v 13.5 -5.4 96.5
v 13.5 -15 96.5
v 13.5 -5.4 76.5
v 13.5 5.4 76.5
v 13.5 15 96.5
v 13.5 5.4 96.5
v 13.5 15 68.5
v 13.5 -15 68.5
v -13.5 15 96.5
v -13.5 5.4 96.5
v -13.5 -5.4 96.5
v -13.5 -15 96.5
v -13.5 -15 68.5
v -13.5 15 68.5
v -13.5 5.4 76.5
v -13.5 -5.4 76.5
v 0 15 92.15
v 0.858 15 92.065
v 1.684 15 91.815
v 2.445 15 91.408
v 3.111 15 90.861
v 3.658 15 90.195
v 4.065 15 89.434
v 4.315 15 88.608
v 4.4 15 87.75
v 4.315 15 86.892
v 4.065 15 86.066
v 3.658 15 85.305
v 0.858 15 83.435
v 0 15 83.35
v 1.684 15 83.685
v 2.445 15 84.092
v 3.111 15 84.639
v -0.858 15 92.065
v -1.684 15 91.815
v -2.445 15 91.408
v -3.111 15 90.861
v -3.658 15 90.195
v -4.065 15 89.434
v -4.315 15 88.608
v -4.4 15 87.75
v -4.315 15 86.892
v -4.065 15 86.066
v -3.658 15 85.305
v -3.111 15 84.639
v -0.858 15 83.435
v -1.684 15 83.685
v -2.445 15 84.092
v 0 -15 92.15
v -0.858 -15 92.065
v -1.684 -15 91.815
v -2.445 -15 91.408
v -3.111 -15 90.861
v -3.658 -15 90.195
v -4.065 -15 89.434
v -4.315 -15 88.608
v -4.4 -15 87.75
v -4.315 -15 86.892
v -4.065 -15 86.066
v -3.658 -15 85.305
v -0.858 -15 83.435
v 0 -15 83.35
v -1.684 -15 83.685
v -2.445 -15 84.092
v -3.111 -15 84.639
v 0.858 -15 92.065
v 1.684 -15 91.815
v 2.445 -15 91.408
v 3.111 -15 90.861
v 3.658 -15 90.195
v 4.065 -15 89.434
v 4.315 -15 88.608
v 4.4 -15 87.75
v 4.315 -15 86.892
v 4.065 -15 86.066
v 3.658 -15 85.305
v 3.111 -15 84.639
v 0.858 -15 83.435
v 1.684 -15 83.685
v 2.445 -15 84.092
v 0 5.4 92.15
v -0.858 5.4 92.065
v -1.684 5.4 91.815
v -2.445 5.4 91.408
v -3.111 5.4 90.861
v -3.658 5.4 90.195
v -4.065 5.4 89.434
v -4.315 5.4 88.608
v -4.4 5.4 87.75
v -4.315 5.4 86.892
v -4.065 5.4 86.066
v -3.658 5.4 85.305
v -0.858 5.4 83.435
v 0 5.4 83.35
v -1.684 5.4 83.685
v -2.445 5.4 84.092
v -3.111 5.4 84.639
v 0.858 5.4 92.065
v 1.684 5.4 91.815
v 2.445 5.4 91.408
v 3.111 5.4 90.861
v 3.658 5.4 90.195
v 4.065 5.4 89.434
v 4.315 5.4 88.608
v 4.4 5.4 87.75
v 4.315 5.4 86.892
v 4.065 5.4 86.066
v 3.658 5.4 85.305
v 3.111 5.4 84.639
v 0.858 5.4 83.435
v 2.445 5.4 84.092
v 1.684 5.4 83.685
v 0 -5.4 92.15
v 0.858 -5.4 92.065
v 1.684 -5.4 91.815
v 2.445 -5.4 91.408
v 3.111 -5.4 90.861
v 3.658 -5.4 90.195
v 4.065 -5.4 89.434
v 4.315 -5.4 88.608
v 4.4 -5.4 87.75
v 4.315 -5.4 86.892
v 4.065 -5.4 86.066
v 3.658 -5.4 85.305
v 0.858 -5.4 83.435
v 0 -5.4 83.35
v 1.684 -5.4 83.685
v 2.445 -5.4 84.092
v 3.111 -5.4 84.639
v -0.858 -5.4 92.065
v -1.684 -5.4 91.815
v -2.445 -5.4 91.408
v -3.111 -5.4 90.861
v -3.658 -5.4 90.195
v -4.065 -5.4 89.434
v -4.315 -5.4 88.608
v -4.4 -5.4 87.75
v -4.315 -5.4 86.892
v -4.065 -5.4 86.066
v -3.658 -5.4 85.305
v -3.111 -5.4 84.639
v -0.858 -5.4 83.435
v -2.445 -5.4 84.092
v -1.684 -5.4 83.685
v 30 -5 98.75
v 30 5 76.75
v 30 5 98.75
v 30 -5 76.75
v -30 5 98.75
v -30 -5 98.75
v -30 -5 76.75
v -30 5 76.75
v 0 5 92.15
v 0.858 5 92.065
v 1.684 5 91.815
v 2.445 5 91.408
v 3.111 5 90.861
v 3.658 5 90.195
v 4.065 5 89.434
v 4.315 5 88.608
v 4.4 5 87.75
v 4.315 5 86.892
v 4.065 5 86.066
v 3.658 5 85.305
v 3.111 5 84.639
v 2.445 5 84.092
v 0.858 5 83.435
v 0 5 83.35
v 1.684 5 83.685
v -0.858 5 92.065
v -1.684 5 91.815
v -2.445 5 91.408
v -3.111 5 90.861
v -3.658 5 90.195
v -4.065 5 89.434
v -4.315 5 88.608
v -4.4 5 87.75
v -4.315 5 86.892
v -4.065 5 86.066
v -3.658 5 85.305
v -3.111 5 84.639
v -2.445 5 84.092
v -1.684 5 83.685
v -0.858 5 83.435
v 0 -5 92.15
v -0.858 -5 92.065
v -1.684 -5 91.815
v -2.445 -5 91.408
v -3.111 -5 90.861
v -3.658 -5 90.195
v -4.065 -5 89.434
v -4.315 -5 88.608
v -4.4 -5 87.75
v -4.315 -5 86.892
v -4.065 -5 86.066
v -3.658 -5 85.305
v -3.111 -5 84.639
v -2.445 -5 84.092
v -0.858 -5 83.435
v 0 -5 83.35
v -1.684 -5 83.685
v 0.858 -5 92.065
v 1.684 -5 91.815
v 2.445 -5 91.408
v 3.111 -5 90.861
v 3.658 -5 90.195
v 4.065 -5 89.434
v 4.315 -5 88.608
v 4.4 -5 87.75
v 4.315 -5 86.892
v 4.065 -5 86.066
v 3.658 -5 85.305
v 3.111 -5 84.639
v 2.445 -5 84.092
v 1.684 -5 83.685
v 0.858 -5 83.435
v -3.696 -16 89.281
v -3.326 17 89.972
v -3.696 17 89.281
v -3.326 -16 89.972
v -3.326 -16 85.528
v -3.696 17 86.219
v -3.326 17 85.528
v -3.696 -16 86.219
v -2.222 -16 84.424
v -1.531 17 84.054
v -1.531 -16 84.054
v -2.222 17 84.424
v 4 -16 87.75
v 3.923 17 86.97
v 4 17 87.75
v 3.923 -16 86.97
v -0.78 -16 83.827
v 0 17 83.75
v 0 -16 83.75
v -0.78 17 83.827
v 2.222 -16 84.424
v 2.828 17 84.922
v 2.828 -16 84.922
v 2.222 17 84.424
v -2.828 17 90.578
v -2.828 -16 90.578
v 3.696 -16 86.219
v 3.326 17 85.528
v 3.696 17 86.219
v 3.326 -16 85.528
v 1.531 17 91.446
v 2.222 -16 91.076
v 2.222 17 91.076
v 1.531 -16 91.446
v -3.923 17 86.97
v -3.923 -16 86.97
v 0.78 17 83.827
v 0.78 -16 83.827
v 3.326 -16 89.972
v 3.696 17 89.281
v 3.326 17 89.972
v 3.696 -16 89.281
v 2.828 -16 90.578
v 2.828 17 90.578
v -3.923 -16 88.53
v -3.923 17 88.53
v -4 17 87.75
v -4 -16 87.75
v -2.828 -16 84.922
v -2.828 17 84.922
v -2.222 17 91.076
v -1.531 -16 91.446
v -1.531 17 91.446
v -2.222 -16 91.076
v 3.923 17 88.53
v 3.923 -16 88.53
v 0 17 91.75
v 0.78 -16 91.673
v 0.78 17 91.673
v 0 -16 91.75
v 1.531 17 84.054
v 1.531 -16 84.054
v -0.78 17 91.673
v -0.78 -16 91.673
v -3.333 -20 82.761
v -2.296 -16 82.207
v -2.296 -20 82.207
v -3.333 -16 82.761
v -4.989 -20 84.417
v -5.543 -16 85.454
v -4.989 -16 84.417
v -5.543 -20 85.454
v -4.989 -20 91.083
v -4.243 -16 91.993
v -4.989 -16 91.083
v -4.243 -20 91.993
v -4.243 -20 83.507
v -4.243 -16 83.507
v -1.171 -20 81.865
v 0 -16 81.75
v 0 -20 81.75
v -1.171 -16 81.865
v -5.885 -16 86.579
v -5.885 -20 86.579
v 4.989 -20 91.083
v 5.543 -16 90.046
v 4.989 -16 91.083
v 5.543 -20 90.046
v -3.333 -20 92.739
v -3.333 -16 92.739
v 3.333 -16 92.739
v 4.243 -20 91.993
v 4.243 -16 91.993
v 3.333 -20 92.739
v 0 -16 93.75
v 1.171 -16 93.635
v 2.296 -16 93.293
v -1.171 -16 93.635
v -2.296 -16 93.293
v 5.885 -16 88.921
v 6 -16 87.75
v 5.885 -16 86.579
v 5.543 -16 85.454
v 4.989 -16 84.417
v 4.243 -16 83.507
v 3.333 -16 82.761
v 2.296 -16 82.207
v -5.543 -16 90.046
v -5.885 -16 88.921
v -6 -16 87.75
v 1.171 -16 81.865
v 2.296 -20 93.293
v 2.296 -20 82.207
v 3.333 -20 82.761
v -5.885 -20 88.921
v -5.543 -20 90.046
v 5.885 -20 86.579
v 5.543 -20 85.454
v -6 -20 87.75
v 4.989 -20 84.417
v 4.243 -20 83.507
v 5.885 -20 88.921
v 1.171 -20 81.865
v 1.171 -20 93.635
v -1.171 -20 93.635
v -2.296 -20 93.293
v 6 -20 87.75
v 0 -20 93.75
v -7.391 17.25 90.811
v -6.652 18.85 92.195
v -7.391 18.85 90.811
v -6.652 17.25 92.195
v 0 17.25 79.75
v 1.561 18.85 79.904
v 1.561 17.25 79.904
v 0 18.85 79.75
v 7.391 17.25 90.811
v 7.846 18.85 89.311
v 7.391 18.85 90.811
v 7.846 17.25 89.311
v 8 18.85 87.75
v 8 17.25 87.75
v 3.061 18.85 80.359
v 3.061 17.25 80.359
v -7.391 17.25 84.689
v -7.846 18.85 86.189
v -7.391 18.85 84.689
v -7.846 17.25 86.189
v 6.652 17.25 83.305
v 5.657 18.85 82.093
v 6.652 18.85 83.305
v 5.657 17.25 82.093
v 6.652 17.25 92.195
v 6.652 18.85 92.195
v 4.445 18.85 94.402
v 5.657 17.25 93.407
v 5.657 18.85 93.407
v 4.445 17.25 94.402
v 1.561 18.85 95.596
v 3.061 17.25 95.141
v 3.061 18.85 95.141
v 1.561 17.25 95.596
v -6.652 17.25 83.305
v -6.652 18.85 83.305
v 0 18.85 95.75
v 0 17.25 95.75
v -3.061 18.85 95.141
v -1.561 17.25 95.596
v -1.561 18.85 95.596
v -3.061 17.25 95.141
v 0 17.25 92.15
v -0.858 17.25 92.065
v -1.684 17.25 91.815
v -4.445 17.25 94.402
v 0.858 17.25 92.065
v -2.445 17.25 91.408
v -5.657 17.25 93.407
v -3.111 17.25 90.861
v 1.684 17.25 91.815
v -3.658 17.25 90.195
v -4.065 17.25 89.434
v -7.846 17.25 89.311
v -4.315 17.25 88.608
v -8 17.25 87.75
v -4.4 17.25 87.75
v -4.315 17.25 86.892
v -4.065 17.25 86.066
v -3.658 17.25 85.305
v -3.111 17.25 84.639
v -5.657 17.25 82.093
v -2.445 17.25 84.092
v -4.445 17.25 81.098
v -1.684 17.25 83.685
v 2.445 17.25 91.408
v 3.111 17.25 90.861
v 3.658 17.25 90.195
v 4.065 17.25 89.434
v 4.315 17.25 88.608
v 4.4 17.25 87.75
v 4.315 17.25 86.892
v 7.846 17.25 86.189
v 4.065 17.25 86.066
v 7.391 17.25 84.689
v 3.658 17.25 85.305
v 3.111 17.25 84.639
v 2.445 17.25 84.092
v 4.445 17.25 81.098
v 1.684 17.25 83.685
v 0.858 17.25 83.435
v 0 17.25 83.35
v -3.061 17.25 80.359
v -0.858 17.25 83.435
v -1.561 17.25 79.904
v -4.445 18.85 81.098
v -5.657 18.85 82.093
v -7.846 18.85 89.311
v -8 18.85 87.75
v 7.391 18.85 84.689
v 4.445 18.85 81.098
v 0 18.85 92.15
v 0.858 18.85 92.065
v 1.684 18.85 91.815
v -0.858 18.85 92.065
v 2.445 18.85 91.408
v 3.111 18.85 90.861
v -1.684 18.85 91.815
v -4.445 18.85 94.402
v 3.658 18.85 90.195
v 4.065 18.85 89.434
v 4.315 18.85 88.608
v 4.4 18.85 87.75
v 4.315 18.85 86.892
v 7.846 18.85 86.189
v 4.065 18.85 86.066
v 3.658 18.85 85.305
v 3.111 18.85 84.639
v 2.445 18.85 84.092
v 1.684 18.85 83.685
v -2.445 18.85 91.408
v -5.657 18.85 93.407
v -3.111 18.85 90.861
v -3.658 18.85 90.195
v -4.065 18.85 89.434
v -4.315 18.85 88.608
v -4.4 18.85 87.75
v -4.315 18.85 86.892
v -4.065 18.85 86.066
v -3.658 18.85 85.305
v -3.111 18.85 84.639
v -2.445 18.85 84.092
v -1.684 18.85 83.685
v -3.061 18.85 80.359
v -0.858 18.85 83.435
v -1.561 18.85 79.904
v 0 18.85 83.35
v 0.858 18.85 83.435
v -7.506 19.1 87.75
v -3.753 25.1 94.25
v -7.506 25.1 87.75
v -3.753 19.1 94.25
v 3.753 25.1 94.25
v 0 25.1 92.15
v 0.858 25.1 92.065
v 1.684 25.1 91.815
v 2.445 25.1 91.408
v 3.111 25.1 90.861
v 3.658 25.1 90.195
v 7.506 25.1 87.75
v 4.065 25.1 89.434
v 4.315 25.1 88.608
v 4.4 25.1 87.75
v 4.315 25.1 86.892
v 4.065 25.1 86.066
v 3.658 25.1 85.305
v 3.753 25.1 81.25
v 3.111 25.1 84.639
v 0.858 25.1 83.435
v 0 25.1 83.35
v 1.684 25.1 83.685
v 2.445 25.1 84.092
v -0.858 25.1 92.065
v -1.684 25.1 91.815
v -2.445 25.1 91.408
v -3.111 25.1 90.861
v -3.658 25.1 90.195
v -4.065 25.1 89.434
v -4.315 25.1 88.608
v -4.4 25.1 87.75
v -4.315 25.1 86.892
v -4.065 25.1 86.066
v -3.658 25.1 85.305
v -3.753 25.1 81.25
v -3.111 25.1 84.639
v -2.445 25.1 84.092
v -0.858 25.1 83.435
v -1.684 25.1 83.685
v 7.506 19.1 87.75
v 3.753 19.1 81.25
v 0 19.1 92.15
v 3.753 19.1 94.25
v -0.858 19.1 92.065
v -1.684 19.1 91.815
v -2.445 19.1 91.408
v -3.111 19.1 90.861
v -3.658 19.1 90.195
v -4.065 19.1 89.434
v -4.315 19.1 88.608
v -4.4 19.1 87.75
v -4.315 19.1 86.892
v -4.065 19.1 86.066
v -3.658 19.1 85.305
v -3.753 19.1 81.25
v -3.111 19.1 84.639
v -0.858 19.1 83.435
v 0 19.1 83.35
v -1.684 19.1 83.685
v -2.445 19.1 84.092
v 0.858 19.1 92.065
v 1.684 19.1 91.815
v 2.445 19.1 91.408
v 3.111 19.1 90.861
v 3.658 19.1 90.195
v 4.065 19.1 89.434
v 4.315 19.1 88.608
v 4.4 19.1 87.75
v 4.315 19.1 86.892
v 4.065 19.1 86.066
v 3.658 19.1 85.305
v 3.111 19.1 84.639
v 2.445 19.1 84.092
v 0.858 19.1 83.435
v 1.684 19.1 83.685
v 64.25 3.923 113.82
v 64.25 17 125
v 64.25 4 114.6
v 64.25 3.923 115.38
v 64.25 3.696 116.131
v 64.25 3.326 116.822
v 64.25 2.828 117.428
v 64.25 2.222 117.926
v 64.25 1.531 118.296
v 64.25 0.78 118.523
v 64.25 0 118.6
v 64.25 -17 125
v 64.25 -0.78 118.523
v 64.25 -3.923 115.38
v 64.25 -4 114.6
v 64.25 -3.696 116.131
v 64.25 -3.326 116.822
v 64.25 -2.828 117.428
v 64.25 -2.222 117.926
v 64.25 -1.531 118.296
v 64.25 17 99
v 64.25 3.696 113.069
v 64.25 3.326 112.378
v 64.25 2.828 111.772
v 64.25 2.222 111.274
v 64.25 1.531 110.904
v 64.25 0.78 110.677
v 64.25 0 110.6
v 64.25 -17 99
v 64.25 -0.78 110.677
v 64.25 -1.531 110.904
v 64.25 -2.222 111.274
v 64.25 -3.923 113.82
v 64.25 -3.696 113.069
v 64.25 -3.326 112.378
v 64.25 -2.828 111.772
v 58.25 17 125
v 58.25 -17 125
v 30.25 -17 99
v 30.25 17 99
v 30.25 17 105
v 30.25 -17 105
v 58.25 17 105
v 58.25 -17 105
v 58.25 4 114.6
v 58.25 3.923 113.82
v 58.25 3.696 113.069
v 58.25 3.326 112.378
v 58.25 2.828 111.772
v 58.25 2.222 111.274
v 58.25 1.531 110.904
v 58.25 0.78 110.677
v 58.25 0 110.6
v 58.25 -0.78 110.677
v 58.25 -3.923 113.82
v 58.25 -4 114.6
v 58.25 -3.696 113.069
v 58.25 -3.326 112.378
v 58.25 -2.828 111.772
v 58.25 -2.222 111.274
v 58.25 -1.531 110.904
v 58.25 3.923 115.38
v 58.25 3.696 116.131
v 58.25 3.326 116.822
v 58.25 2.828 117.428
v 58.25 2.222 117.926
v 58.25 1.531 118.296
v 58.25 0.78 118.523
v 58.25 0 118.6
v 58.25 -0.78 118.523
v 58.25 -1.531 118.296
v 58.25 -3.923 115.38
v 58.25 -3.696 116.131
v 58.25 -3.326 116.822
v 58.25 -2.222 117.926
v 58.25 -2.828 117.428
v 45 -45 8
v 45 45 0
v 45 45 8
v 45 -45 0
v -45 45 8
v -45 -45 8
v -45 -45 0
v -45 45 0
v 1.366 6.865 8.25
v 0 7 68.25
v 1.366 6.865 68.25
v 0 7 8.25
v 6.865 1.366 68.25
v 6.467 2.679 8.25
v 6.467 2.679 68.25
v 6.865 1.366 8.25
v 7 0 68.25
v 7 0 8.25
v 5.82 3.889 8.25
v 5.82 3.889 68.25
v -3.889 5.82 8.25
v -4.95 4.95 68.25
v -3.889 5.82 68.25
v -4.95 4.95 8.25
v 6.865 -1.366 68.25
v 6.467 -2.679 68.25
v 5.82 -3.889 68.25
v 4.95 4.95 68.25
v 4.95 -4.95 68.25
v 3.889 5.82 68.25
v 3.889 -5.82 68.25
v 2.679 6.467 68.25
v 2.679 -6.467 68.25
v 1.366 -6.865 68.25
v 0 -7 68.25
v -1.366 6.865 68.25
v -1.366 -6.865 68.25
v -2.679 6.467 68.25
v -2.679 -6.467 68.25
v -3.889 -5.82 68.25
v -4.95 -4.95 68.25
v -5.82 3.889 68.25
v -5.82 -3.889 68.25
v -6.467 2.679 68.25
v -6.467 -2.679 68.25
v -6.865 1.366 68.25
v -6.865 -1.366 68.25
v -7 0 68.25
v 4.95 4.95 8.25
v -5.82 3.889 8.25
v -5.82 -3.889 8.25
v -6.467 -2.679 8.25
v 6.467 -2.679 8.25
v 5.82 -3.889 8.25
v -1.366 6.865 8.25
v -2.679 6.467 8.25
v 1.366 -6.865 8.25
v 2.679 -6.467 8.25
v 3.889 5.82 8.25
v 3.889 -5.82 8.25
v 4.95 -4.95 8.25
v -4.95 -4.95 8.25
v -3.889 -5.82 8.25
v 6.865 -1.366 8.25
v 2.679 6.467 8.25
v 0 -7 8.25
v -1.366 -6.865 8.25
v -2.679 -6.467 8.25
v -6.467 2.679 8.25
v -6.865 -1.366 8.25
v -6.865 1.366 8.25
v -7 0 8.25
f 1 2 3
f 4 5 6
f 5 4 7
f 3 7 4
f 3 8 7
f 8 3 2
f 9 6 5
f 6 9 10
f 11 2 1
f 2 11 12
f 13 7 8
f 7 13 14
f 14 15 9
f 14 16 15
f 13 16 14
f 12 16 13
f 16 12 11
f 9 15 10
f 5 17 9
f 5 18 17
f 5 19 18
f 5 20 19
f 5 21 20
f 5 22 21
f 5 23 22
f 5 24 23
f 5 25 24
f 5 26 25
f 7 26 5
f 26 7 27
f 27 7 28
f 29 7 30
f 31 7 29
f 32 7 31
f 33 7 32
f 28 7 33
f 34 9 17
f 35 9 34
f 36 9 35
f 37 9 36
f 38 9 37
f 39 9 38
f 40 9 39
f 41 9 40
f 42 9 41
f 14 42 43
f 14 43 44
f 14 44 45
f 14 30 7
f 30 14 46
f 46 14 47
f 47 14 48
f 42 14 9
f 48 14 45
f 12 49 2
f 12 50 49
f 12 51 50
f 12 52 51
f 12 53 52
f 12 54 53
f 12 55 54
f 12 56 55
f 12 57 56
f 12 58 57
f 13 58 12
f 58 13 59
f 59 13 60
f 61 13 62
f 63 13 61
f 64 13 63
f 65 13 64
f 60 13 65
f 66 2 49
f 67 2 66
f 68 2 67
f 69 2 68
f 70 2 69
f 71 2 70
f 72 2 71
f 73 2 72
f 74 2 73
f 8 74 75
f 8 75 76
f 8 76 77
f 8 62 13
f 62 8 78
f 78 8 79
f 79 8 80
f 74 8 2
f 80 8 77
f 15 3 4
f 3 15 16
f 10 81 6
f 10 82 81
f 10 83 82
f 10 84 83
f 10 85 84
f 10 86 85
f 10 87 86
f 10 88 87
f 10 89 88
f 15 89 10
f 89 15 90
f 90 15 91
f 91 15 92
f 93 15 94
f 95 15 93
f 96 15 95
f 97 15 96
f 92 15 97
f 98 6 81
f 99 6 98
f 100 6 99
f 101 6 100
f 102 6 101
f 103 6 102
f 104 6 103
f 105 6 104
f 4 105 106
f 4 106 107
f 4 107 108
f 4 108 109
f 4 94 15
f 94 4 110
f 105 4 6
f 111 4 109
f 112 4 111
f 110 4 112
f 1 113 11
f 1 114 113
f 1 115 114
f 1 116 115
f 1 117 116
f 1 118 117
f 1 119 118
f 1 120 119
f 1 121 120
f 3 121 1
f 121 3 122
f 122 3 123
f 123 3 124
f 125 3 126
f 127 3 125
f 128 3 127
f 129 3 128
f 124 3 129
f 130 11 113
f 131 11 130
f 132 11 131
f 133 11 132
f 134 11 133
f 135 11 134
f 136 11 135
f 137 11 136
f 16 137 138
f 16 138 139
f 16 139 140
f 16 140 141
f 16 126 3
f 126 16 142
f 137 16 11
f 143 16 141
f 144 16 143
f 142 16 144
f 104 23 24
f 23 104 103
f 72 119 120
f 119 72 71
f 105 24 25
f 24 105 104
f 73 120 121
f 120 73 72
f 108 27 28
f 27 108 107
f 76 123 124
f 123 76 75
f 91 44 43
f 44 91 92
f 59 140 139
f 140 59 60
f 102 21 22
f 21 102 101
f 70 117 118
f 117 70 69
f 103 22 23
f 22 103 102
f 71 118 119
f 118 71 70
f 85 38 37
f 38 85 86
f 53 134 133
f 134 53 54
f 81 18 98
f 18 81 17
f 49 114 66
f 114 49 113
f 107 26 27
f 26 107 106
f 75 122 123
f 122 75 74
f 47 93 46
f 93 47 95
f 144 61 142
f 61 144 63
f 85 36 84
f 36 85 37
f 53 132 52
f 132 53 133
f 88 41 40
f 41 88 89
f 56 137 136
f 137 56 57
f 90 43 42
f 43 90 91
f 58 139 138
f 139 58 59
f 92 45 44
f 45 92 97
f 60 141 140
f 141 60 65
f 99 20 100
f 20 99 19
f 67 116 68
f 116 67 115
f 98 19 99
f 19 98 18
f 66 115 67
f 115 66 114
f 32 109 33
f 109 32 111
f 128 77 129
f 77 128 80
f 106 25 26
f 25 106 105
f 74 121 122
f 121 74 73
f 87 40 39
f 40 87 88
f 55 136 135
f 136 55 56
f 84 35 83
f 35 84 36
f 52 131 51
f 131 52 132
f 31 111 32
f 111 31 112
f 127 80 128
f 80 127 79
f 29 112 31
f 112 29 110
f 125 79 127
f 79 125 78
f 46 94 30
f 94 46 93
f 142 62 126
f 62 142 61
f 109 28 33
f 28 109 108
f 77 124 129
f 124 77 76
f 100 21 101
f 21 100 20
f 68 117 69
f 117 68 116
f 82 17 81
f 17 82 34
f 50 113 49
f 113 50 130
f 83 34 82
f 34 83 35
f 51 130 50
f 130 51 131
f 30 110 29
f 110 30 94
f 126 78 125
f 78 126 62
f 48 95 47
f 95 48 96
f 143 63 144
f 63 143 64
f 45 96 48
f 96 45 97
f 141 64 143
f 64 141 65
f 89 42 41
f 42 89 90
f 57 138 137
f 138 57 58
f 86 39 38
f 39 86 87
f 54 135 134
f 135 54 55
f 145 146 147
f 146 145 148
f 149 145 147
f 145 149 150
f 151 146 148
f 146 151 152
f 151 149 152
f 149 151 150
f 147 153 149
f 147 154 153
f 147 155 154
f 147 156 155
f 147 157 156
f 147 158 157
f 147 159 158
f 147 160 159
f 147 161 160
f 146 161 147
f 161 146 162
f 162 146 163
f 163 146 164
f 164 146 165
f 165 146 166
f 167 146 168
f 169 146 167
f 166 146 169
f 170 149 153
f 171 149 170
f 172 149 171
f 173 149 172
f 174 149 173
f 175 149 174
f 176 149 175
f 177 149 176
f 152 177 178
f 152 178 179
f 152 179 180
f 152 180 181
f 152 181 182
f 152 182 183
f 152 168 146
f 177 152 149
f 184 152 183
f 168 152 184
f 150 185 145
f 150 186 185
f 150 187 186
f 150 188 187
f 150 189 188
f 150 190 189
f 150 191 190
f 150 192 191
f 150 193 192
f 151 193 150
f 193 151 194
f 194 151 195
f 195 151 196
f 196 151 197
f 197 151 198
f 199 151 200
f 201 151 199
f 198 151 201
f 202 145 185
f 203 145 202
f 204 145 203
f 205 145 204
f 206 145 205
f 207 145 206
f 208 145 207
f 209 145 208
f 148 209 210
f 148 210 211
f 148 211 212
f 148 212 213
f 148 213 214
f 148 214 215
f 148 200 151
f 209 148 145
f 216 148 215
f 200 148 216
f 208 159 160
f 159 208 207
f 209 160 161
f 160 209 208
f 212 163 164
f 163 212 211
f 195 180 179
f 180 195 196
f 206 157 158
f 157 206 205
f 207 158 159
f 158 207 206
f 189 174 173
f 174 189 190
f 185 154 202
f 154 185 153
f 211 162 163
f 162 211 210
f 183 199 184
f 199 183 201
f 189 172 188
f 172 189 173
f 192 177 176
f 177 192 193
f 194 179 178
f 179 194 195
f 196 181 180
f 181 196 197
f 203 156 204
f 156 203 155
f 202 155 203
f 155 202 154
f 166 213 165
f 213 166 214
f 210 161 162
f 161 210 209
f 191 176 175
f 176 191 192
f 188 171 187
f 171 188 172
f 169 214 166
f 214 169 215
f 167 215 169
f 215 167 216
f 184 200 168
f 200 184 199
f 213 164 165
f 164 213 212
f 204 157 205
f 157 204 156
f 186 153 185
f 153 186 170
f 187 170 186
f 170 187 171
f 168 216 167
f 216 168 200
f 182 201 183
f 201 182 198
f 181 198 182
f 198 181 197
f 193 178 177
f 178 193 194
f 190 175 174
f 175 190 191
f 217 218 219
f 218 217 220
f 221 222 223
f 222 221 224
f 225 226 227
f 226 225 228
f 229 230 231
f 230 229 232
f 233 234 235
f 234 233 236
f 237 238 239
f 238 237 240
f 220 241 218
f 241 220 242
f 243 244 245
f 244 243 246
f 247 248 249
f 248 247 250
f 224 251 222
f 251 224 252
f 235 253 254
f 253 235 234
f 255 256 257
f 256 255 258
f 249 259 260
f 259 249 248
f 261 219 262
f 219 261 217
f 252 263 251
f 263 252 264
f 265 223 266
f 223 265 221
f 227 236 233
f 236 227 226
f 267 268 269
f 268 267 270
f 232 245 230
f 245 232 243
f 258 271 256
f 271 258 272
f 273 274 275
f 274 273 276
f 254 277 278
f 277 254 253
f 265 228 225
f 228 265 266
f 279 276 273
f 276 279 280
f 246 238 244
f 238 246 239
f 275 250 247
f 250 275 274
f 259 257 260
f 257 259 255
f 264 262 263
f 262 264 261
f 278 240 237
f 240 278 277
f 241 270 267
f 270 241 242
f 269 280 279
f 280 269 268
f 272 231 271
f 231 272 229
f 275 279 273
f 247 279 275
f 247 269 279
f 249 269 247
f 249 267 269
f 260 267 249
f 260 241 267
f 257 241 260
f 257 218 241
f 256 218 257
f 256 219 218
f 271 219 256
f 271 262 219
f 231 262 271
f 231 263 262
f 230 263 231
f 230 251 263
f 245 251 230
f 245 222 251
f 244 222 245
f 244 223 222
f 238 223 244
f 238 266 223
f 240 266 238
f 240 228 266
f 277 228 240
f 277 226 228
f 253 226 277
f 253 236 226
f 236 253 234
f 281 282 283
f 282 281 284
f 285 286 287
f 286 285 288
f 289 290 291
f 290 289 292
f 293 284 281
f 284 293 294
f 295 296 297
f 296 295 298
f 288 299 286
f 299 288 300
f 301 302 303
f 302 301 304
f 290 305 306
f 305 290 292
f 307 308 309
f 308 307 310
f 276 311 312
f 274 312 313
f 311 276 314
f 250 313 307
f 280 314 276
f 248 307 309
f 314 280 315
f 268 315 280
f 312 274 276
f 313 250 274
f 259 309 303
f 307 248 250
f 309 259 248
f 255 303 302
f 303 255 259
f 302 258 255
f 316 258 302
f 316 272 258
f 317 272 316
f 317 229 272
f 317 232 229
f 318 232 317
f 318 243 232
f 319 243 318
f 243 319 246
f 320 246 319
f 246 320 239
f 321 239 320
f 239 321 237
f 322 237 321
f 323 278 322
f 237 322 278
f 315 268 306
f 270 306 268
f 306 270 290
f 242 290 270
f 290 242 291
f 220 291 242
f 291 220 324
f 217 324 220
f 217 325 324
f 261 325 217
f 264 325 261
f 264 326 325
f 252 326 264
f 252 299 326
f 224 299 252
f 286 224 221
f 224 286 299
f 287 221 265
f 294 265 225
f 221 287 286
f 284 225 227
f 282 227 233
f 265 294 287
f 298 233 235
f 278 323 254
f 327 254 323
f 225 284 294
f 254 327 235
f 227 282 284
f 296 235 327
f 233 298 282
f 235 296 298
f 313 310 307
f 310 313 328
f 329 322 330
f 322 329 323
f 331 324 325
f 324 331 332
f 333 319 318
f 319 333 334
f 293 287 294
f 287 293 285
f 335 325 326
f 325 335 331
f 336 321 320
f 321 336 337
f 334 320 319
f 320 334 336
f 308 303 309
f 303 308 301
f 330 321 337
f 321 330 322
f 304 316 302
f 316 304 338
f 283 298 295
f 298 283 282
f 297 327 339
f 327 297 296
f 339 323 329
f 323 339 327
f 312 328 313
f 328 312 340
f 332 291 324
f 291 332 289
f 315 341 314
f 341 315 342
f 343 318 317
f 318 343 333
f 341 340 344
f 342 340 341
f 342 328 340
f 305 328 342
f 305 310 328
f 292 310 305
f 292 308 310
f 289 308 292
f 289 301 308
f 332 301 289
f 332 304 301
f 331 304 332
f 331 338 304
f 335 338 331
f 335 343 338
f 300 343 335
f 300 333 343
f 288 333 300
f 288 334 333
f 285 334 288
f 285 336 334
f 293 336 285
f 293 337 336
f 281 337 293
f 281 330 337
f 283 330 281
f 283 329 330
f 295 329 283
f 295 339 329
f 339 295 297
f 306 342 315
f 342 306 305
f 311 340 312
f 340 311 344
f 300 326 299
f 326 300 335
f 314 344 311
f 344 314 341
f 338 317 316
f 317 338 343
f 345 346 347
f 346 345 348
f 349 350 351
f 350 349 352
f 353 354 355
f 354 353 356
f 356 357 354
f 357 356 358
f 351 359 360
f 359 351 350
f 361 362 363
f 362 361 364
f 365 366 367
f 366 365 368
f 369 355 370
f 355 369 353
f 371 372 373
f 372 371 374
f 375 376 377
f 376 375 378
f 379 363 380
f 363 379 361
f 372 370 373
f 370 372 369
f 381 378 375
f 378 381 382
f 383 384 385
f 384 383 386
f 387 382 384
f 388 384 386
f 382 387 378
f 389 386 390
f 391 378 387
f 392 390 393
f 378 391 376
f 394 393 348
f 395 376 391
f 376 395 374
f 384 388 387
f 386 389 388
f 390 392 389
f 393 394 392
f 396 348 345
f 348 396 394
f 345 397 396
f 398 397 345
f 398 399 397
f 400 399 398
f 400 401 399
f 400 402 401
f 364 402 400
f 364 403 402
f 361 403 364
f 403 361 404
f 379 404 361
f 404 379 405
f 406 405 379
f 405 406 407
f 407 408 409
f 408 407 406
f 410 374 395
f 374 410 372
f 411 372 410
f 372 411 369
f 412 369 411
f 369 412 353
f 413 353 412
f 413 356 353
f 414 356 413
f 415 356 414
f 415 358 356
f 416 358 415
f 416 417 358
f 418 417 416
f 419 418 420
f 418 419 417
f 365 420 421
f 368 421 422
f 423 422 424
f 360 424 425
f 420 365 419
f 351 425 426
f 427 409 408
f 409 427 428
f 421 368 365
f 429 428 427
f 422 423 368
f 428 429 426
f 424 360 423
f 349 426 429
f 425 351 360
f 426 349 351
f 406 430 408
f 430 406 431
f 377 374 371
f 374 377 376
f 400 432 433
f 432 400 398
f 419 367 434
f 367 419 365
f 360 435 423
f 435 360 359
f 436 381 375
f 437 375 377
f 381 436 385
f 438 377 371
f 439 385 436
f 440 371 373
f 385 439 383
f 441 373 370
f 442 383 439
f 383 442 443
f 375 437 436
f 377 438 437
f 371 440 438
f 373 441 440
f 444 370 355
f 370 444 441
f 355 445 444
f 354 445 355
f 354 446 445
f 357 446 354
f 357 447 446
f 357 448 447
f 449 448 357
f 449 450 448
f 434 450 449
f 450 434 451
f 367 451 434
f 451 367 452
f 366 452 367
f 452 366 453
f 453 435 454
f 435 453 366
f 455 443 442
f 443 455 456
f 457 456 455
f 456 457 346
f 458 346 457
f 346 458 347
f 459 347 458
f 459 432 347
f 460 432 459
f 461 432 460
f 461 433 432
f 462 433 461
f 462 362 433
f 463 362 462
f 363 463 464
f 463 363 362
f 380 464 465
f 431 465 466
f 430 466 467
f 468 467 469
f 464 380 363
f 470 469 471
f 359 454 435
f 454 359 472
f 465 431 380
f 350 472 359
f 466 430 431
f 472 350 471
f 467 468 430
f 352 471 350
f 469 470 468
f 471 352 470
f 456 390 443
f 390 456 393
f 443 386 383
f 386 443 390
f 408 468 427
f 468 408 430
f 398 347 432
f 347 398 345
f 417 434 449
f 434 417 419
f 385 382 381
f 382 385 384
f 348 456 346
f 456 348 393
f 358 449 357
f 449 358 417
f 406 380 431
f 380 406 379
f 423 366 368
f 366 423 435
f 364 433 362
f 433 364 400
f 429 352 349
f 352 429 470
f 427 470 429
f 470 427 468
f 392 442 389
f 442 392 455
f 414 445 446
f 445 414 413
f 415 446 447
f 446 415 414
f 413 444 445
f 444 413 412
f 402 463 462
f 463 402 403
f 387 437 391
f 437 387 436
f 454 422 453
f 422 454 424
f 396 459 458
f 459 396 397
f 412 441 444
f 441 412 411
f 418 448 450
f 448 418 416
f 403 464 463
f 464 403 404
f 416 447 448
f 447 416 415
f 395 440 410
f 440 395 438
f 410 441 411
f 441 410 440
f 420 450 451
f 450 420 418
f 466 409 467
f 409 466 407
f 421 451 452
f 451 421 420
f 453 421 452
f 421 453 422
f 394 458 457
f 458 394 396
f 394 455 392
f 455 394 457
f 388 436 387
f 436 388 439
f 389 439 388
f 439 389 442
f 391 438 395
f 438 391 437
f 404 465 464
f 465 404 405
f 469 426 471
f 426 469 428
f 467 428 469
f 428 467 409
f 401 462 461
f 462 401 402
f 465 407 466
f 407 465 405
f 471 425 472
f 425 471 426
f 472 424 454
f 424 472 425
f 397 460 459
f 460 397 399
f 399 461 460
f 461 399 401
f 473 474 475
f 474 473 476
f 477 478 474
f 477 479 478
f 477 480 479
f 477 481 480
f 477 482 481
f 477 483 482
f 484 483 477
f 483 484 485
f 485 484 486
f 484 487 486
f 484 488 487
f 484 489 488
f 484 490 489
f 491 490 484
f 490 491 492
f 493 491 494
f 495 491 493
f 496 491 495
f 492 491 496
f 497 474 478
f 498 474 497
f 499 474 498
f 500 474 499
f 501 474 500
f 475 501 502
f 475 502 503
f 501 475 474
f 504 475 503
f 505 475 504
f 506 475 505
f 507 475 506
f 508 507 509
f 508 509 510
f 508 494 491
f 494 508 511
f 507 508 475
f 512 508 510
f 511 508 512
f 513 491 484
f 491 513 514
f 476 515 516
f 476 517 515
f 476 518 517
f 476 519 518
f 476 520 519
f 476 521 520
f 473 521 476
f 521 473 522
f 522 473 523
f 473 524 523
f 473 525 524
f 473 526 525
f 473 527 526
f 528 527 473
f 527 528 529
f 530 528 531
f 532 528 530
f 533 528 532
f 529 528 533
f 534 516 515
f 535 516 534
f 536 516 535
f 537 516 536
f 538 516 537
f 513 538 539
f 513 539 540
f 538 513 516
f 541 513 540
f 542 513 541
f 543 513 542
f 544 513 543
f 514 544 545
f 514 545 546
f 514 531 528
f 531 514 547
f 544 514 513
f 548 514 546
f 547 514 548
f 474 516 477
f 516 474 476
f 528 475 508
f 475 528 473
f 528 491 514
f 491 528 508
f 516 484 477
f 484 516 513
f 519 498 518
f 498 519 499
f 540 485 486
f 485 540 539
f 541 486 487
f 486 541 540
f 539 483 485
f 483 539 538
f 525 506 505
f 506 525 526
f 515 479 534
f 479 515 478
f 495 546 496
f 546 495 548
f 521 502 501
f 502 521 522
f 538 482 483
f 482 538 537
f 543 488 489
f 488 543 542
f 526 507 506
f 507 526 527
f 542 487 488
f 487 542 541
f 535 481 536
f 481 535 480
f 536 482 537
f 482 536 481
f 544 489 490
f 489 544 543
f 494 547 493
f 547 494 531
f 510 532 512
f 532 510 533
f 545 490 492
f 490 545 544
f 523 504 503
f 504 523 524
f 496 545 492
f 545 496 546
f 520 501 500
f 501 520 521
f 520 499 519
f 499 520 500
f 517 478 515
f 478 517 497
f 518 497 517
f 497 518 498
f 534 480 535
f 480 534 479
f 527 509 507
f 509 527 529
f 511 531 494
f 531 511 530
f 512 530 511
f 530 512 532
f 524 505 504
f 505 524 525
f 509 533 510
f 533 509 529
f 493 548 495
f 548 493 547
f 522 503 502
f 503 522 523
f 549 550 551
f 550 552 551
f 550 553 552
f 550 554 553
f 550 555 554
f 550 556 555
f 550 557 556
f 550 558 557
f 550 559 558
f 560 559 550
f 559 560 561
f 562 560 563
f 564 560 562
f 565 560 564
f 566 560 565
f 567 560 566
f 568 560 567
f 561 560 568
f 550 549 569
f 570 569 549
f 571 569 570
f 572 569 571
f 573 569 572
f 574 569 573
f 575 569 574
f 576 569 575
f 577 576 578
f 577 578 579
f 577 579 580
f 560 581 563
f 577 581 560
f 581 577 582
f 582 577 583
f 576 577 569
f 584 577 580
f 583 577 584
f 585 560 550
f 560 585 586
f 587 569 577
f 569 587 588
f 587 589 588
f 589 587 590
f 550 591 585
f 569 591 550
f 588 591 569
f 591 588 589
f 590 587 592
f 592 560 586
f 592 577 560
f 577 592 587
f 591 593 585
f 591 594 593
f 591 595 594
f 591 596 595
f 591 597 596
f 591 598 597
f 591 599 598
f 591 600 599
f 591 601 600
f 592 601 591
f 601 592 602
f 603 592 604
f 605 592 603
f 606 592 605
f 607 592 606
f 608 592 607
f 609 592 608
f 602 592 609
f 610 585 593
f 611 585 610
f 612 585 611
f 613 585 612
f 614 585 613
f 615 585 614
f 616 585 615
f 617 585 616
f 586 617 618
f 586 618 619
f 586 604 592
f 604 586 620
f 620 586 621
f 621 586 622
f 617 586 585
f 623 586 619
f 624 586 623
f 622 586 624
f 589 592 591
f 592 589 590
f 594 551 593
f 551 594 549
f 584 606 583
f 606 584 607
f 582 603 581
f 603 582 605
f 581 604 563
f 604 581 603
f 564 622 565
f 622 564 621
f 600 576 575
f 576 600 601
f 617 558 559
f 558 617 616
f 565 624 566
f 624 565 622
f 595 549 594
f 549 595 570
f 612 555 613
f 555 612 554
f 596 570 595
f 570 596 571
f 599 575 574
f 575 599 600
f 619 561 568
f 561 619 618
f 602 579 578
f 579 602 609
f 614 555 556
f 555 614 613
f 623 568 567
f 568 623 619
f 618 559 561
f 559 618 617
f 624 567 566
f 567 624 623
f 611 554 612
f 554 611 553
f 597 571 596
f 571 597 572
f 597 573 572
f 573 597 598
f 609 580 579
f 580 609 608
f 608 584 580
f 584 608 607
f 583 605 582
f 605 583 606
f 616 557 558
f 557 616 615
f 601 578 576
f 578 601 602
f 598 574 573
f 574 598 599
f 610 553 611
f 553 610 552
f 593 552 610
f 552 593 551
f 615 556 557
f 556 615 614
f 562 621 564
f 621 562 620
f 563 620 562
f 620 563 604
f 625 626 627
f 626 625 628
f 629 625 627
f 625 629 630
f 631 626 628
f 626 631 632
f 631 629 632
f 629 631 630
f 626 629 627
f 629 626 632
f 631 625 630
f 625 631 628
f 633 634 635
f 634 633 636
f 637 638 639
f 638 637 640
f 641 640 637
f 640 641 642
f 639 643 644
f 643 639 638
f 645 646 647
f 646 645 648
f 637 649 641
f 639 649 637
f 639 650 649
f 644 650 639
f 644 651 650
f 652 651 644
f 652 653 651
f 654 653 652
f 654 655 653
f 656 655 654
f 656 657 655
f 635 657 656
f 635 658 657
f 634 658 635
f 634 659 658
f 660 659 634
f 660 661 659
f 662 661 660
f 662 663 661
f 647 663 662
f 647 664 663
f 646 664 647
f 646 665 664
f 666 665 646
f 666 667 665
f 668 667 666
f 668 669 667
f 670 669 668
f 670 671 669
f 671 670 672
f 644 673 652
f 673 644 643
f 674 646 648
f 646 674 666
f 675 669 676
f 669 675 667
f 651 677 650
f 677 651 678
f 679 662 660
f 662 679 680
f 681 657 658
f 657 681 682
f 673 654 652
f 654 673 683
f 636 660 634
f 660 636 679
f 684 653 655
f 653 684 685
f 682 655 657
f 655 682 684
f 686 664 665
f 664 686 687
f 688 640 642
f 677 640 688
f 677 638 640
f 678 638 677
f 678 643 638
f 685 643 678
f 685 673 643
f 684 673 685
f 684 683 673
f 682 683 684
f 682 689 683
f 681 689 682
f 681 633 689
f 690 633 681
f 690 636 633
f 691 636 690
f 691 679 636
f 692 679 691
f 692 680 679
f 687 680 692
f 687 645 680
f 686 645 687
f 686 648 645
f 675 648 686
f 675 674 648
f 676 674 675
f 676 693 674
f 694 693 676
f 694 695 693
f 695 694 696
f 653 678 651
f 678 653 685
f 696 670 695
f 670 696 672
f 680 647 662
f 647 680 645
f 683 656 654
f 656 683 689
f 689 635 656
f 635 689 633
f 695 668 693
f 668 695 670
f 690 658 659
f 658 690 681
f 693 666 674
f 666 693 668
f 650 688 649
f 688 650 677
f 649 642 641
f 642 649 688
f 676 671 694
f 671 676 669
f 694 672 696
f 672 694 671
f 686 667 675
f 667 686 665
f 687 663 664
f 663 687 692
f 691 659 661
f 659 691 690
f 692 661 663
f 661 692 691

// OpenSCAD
$fn = 32;

// ------------------------------------------------------------------------
// Lamp arm: column d14 x 60 mm, arm 60 mm
// Every part is its own module, assembly() places every instance.
// ------------------------------------------------------------------------

// --- part 1 ---
module lamp_base() {
  difference() {
    translate([-45, -45, 0]) cube([90, 90, 8]);
  }
}

// --- part 2 ---
module lamp_column() {
  cylinder(h = 60, d = 14);
}

// --- part 3 ---
module head_fork() {
  difference() {
    translate([-13.5, -15, 0]) cube([27, 30, 28]);
    translate([-14.5, -5.4, 8]) cube([29, 10.8, 21]);
    translate([0, 0, 19.25]) rotate([90, 0, 0]) cylinder(h = 32, d = 8.8, center = true);
  }
}

// --- part 4 ---
module lamp_arm() {
  difference() {
    translate([-30, -5, 0]) cube([60, 10, 22]);
    translate([0, 0, 11]) rotate([90, 0, 0]) cylinder(h = 12, d = 8.8, center = true);
  }
}

// --- part 5 ---
module arm_pin() {
  rotate([0, 90, 0]) cylinder(h = 34, d = 8, center = true);
  translate([-20, 0, 0]) rotate([0, 90, 0]) cylinder(h = 4, d = 12);
}

// --- part 6 ---
module arm_washer() {
  difference() {
      translate([0, 0, 0]) cylinder(h = 1.6, d = 16);
      translate([0, 0, -1]) cylinder(h = 3.6, d = 8.8);
    }
}

// --- part 7 ---
module arm_nut() {
  difference() {
    linear_extrude(height = 6) polygon(points = [[7.506, 0], [3.753, 6.5], [-3.753, 6.5], [-7.506, 0], [-3.753, -6.5], [3.753, -6.5]]);
    translate([0, 0, -1]) cylinder(h = 8, d = 8.8);
  }
}

// --- part 8 ---
module shade_bracket() {
  difference() {
    translate([-17, -17, 0]) cube([34, 34, 26]);
    translate([-18, -18, 6]) cube([29, 36, 21]);
    translate([14, 0, 15.6]) rotate([0, 90, 0]) cylinder(h = 8, d = 8, center = true);
  }
}

// --- assembly ---
module assembly() {
  color([0.80, 0.24, 0.20]) translate([0, 0, 0]) rotate([0, 0, 0]) lamp_base();
  color([0.20, 0.45, 0.75]) translate([0, 0, 8.25]) rotate([0, 0, 0]) lamp_column();
  color([0.25, 0.62, 0.32]) translate([0, 0, 68.5]) rotate([0, 0, 0]) head_fork();
  color([0.92, 0.70, 0.18]) translate([0, 0, 76.75]) rotate([0, 0, 0]) lamp_arm();
  color([0.58, 0.35, 0.70]) translate([0, 0, 87.75]) rotate([0, 0, 90]) arm_pin();
  color([0.16, 0.66, 0.66]) translate([0, 18.85, 87.75]) rotate([90, 0, 0]) arm_washer();
  color([0.85, 0.48, 0.18]) translate([0, 25.1, 87.75]) rotate([90, 0, 0]) arm_nut();
  color([0.55, 0.60, 0.65]) translate([47.25, 0, 99]) rotate([0, 0, 0]) shade_bracket();
}

assembly();
